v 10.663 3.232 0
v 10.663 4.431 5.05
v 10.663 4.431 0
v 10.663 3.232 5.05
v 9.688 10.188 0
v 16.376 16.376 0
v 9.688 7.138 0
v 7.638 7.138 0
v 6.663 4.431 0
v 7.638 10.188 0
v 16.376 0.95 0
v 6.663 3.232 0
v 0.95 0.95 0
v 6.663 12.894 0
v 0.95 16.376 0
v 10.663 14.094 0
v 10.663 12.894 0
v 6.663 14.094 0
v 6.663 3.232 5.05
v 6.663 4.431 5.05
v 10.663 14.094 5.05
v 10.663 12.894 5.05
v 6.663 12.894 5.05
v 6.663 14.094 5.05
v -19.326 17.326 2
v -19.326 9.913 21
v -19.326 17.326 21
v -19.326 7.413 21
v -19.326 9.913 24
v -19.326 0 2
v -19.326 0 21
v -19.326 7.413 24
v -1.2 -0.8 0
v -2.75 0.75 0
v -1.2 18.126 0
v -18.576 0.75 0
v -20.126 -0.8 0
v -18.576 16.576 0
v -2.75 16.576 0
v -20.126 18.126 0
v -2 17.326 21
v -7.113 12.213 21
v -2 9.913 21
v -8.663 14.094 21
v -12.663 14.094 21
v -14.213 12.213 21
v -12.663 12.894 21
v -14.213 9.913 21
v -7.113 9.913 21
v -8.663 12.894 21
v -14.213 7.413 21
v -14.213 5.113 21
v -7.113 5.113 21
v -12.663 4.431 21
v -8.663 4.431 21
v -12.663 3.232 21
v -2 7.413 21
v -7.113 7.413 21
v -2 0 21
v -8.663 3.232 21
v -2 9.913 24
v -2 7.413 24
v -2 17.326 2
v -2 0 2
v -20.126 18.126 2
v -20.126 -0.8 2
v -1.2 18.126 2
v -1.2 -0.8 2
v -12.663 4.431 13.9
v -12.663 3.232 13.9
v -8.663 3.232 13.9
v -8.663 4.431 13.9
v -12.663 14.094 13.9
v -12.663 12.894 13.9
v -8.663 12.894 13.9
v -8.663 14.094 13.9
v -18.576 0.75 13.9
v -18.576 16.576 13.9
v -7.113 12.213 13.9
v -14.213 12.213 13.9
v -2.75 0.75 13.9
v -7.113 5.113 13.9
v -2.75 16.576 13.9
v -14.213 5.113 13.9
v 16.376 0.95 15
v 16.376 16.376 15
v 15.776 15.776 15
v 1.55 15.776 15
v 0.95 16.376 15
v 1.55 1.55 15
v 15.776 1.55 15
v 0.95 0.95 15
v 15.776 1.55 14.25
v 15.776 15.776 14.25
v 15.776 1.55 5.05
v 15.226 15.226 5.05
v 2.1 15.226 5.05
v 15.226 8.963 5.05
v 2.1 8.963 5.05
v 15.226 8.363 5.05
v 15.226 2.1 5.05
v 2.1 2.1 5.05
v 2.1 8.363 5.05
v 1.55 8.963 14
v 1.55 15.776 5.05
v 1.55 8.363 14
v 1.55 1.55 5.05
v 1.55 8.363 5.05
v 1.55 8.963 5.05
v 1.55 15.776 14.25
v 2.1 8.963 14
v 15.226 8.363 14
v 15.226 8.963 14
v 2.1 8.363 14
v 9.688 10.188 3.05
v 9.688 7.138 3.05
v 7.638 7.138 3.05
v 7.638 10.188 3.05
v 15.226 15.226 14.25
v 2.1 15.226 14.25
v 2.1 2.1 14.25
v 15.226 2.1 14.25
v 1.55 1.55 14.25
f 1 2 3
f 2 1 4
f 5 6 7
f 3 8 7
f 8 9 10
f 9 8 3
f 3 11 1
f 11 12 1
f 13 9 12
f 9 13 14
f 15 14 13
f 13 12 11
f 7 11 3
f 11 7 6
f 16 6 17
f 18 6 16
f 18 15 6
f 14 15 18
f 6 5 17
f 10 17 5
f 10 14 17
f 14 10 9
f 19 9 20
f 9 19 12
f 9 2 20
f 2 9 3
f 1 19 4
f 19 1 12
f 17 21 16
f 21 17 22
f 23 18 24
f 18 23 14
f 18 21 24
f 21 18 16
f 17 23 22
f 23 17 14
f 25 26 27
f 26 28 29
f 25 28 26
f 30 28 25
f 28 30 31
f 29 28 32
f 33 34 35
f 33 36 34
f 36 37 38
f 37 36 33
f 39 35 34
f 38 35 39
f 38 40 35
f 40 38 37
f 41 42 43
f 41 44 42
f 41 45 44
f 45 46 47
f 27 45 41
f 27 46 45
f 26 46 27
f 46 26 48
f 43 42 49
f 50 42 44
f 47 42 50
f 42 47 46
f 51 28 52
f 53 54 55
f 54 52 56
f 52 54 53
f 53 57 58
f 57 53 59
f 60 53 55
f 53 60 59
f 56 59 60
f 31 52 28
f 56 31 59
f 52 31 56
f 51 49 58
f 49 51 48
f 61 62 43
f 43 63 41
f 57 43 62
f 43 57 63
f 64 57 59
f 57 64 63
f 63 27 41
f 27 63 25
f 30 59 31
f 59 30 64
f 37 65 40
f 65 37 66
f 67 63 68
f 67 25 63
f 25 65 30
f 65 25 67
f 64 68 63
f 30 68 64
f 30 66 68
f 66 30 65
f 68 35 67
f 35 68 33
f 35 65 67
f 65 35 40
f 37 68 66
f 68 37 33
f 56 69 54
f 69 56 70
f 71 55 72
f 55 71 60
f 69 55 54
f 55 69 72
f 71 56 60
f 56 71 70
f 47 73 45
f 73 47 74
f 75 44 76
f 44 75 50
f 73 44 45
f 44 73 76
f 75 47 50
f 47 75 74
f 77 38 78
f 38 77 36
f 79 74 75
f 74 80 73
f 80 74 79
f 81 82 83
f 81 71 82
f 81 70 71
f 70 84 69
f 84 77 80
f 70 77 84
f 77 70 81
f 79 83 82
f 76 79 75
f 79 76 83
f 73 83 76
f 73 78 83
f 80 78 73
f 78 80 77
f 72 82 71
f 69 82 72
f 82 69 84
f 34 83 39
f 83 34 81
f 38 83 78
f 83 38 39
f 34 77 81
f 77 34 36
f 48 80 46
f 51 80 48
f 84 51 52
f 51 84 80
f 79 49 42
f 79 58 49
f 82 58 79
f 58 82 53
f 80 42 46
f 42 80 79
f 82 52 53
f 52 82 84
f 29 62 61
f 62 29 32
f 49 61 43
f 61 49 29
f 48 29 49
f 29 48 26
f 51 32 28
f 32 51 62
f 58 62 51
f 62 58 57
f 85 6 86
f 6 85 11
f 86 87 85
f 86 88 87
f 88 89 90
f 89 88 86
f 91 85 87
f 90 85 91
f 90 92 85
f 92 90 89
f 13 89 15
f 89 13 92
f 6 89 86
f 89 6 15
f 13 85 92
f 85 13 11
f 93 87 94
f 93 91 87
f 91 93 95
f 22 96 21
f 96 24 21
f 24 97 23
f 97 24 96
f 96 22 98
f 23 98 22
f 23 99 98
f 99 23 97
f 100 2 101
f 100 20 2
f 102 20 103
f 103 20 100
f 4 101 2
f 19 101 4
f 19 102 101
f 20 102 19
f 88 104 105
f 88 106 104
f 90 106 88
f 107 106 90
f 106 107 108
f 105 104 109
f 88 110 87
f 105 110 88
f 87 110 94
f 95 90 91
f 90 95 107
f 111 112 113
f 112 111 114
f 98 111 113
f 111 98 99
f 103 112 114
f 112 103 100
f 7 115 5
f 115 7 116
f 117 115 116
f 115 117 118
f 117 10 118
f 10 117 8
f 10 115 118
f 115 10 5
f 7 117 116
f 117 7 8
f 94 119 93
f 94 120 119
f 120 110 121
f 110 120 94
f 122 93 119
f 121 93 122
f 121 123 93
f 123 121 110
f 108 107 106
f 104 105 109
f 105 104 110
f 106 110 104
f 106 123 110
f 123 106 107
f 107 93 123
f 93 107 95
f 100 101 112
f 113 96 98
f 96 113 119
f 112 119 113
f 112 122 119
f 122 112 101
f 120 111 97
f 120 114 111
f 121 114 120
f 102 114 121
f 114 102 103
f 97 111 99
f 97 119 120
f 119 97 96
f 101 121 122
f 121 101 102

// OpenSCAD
// note: current lens size is 14.226 (without tol)

wall_thickness = .75;
button_wall_thickness = .6;

tol_tight = 0.1;
tol_very_tight = .05;
tol_wall = 0.2;

outer_width = .69*25.4-tol_tight*2;//   + .5;
outer_lip = .8;//.75;
outer_lip_height = 2;//2;
outer_height = 21;

switch_height = 15;

button_height = 7+tol_tight;
button_width = 7+tol_tight;

inner_width = outer_width - wall_thickness*2 - tol_wall*2; //14.526 //15.026

translate([-2, 0, outer_height])
rotate([0, 180, 0])
//translate([-18, 0, 3])
outer_switch();

//translate([5, 0, 0])
//translate([0, 0, button_height + 0.2]) 
inner_switch();

module outer_switch() {
	bridge();
	difference () {
		union() {
			cube([outer_width, outer_width, outer_height]);
			translate([-outer_lip, -outer_lip, outer_height-outer_lip_height]) 
				cube([outer_width + outer_lip*2, outer_width + outer_lip*2, outer_lip_height]);
		}
		
		w = outer_width - wall_thickness*2;
		translate([wall_thickness, wall_thickness, button_height]) cube([w, w, outer_height]);
		translate([outer_width/2 - button_width/2, outer_width/2 - button_width/2, 0])
			cube([button_width, button_width, button_height]);
		led_holes();
	}
}

module inner_switch() {
	extrusion_height = 3+tol_very_tight;
	extrusion_width = 2+tol_very_tight;
	extrusion_depth = 3+tol_very_tight;
	difference() {
		translate([wall_thickness + tol_wall, wall_thickness + tol_wall, 0]) {
			difference() {
			union() {
				difference() {
					cube([inner_width, inner_width, switch_height]);
					
					translate([button_wall_thickness, button_wall_thickness, extrusion_height+2]) // space above the extrusion
						cube([inner_width - button_wall_thickness*2, inner_width - button_wall_thickness*2, switch_height]);
				}
				translate([0, inner_width / 2 - button_wall_thickness/2, 0]) 
					cube([inner_width, button_wall_thickness, switch_height - 1]);
			}
			translate([inner_width/2 - extrusion_width/2, inner_width/2 - extrusion_depth/2, 0]) 
				cube([extrusion_width, extrusion_depth, extrusion_height]);
			}
			
			// lip for mounting lens
			lip_depth = 1.5;
			lip_size = .55;
			translate([inner_width/2, inner_width/2, 0]) translate([0, 0, switch_height/2]) 
			difference() {
				cube([inner_width-button_wall_thickness*2, inner_width-button_wall_thickness*2, switch_height-lip_depth], center=true);
				cube([inner_width-button_wall_thickness*2-lip_size*2, inner_width-button_wall_thickness*2-lip_size*2, switch_height-lip_depth], center=true);
			}
		}
		led_holes();
	}
}

module bridge() {
	bridge_width = 2.5;
	bridge_length = outer_width;
	h = 3;
	translate([outer_width/2, outer_width/2, -h/2]) cube([bridge_length, bridge_width, h], center=true);
}

module led_holes() {
	squeeze = -.5;
	translate([outer_width / 2, outer_width /4 + squeeze])
	translate([0, 0, 5]) {
		cube([4, 1.2, 10], center=true);
		translate([0, outer_width / 2 - squeeze*2, 0]) cube([4, 1.2, 10], center=true);
	}
}
